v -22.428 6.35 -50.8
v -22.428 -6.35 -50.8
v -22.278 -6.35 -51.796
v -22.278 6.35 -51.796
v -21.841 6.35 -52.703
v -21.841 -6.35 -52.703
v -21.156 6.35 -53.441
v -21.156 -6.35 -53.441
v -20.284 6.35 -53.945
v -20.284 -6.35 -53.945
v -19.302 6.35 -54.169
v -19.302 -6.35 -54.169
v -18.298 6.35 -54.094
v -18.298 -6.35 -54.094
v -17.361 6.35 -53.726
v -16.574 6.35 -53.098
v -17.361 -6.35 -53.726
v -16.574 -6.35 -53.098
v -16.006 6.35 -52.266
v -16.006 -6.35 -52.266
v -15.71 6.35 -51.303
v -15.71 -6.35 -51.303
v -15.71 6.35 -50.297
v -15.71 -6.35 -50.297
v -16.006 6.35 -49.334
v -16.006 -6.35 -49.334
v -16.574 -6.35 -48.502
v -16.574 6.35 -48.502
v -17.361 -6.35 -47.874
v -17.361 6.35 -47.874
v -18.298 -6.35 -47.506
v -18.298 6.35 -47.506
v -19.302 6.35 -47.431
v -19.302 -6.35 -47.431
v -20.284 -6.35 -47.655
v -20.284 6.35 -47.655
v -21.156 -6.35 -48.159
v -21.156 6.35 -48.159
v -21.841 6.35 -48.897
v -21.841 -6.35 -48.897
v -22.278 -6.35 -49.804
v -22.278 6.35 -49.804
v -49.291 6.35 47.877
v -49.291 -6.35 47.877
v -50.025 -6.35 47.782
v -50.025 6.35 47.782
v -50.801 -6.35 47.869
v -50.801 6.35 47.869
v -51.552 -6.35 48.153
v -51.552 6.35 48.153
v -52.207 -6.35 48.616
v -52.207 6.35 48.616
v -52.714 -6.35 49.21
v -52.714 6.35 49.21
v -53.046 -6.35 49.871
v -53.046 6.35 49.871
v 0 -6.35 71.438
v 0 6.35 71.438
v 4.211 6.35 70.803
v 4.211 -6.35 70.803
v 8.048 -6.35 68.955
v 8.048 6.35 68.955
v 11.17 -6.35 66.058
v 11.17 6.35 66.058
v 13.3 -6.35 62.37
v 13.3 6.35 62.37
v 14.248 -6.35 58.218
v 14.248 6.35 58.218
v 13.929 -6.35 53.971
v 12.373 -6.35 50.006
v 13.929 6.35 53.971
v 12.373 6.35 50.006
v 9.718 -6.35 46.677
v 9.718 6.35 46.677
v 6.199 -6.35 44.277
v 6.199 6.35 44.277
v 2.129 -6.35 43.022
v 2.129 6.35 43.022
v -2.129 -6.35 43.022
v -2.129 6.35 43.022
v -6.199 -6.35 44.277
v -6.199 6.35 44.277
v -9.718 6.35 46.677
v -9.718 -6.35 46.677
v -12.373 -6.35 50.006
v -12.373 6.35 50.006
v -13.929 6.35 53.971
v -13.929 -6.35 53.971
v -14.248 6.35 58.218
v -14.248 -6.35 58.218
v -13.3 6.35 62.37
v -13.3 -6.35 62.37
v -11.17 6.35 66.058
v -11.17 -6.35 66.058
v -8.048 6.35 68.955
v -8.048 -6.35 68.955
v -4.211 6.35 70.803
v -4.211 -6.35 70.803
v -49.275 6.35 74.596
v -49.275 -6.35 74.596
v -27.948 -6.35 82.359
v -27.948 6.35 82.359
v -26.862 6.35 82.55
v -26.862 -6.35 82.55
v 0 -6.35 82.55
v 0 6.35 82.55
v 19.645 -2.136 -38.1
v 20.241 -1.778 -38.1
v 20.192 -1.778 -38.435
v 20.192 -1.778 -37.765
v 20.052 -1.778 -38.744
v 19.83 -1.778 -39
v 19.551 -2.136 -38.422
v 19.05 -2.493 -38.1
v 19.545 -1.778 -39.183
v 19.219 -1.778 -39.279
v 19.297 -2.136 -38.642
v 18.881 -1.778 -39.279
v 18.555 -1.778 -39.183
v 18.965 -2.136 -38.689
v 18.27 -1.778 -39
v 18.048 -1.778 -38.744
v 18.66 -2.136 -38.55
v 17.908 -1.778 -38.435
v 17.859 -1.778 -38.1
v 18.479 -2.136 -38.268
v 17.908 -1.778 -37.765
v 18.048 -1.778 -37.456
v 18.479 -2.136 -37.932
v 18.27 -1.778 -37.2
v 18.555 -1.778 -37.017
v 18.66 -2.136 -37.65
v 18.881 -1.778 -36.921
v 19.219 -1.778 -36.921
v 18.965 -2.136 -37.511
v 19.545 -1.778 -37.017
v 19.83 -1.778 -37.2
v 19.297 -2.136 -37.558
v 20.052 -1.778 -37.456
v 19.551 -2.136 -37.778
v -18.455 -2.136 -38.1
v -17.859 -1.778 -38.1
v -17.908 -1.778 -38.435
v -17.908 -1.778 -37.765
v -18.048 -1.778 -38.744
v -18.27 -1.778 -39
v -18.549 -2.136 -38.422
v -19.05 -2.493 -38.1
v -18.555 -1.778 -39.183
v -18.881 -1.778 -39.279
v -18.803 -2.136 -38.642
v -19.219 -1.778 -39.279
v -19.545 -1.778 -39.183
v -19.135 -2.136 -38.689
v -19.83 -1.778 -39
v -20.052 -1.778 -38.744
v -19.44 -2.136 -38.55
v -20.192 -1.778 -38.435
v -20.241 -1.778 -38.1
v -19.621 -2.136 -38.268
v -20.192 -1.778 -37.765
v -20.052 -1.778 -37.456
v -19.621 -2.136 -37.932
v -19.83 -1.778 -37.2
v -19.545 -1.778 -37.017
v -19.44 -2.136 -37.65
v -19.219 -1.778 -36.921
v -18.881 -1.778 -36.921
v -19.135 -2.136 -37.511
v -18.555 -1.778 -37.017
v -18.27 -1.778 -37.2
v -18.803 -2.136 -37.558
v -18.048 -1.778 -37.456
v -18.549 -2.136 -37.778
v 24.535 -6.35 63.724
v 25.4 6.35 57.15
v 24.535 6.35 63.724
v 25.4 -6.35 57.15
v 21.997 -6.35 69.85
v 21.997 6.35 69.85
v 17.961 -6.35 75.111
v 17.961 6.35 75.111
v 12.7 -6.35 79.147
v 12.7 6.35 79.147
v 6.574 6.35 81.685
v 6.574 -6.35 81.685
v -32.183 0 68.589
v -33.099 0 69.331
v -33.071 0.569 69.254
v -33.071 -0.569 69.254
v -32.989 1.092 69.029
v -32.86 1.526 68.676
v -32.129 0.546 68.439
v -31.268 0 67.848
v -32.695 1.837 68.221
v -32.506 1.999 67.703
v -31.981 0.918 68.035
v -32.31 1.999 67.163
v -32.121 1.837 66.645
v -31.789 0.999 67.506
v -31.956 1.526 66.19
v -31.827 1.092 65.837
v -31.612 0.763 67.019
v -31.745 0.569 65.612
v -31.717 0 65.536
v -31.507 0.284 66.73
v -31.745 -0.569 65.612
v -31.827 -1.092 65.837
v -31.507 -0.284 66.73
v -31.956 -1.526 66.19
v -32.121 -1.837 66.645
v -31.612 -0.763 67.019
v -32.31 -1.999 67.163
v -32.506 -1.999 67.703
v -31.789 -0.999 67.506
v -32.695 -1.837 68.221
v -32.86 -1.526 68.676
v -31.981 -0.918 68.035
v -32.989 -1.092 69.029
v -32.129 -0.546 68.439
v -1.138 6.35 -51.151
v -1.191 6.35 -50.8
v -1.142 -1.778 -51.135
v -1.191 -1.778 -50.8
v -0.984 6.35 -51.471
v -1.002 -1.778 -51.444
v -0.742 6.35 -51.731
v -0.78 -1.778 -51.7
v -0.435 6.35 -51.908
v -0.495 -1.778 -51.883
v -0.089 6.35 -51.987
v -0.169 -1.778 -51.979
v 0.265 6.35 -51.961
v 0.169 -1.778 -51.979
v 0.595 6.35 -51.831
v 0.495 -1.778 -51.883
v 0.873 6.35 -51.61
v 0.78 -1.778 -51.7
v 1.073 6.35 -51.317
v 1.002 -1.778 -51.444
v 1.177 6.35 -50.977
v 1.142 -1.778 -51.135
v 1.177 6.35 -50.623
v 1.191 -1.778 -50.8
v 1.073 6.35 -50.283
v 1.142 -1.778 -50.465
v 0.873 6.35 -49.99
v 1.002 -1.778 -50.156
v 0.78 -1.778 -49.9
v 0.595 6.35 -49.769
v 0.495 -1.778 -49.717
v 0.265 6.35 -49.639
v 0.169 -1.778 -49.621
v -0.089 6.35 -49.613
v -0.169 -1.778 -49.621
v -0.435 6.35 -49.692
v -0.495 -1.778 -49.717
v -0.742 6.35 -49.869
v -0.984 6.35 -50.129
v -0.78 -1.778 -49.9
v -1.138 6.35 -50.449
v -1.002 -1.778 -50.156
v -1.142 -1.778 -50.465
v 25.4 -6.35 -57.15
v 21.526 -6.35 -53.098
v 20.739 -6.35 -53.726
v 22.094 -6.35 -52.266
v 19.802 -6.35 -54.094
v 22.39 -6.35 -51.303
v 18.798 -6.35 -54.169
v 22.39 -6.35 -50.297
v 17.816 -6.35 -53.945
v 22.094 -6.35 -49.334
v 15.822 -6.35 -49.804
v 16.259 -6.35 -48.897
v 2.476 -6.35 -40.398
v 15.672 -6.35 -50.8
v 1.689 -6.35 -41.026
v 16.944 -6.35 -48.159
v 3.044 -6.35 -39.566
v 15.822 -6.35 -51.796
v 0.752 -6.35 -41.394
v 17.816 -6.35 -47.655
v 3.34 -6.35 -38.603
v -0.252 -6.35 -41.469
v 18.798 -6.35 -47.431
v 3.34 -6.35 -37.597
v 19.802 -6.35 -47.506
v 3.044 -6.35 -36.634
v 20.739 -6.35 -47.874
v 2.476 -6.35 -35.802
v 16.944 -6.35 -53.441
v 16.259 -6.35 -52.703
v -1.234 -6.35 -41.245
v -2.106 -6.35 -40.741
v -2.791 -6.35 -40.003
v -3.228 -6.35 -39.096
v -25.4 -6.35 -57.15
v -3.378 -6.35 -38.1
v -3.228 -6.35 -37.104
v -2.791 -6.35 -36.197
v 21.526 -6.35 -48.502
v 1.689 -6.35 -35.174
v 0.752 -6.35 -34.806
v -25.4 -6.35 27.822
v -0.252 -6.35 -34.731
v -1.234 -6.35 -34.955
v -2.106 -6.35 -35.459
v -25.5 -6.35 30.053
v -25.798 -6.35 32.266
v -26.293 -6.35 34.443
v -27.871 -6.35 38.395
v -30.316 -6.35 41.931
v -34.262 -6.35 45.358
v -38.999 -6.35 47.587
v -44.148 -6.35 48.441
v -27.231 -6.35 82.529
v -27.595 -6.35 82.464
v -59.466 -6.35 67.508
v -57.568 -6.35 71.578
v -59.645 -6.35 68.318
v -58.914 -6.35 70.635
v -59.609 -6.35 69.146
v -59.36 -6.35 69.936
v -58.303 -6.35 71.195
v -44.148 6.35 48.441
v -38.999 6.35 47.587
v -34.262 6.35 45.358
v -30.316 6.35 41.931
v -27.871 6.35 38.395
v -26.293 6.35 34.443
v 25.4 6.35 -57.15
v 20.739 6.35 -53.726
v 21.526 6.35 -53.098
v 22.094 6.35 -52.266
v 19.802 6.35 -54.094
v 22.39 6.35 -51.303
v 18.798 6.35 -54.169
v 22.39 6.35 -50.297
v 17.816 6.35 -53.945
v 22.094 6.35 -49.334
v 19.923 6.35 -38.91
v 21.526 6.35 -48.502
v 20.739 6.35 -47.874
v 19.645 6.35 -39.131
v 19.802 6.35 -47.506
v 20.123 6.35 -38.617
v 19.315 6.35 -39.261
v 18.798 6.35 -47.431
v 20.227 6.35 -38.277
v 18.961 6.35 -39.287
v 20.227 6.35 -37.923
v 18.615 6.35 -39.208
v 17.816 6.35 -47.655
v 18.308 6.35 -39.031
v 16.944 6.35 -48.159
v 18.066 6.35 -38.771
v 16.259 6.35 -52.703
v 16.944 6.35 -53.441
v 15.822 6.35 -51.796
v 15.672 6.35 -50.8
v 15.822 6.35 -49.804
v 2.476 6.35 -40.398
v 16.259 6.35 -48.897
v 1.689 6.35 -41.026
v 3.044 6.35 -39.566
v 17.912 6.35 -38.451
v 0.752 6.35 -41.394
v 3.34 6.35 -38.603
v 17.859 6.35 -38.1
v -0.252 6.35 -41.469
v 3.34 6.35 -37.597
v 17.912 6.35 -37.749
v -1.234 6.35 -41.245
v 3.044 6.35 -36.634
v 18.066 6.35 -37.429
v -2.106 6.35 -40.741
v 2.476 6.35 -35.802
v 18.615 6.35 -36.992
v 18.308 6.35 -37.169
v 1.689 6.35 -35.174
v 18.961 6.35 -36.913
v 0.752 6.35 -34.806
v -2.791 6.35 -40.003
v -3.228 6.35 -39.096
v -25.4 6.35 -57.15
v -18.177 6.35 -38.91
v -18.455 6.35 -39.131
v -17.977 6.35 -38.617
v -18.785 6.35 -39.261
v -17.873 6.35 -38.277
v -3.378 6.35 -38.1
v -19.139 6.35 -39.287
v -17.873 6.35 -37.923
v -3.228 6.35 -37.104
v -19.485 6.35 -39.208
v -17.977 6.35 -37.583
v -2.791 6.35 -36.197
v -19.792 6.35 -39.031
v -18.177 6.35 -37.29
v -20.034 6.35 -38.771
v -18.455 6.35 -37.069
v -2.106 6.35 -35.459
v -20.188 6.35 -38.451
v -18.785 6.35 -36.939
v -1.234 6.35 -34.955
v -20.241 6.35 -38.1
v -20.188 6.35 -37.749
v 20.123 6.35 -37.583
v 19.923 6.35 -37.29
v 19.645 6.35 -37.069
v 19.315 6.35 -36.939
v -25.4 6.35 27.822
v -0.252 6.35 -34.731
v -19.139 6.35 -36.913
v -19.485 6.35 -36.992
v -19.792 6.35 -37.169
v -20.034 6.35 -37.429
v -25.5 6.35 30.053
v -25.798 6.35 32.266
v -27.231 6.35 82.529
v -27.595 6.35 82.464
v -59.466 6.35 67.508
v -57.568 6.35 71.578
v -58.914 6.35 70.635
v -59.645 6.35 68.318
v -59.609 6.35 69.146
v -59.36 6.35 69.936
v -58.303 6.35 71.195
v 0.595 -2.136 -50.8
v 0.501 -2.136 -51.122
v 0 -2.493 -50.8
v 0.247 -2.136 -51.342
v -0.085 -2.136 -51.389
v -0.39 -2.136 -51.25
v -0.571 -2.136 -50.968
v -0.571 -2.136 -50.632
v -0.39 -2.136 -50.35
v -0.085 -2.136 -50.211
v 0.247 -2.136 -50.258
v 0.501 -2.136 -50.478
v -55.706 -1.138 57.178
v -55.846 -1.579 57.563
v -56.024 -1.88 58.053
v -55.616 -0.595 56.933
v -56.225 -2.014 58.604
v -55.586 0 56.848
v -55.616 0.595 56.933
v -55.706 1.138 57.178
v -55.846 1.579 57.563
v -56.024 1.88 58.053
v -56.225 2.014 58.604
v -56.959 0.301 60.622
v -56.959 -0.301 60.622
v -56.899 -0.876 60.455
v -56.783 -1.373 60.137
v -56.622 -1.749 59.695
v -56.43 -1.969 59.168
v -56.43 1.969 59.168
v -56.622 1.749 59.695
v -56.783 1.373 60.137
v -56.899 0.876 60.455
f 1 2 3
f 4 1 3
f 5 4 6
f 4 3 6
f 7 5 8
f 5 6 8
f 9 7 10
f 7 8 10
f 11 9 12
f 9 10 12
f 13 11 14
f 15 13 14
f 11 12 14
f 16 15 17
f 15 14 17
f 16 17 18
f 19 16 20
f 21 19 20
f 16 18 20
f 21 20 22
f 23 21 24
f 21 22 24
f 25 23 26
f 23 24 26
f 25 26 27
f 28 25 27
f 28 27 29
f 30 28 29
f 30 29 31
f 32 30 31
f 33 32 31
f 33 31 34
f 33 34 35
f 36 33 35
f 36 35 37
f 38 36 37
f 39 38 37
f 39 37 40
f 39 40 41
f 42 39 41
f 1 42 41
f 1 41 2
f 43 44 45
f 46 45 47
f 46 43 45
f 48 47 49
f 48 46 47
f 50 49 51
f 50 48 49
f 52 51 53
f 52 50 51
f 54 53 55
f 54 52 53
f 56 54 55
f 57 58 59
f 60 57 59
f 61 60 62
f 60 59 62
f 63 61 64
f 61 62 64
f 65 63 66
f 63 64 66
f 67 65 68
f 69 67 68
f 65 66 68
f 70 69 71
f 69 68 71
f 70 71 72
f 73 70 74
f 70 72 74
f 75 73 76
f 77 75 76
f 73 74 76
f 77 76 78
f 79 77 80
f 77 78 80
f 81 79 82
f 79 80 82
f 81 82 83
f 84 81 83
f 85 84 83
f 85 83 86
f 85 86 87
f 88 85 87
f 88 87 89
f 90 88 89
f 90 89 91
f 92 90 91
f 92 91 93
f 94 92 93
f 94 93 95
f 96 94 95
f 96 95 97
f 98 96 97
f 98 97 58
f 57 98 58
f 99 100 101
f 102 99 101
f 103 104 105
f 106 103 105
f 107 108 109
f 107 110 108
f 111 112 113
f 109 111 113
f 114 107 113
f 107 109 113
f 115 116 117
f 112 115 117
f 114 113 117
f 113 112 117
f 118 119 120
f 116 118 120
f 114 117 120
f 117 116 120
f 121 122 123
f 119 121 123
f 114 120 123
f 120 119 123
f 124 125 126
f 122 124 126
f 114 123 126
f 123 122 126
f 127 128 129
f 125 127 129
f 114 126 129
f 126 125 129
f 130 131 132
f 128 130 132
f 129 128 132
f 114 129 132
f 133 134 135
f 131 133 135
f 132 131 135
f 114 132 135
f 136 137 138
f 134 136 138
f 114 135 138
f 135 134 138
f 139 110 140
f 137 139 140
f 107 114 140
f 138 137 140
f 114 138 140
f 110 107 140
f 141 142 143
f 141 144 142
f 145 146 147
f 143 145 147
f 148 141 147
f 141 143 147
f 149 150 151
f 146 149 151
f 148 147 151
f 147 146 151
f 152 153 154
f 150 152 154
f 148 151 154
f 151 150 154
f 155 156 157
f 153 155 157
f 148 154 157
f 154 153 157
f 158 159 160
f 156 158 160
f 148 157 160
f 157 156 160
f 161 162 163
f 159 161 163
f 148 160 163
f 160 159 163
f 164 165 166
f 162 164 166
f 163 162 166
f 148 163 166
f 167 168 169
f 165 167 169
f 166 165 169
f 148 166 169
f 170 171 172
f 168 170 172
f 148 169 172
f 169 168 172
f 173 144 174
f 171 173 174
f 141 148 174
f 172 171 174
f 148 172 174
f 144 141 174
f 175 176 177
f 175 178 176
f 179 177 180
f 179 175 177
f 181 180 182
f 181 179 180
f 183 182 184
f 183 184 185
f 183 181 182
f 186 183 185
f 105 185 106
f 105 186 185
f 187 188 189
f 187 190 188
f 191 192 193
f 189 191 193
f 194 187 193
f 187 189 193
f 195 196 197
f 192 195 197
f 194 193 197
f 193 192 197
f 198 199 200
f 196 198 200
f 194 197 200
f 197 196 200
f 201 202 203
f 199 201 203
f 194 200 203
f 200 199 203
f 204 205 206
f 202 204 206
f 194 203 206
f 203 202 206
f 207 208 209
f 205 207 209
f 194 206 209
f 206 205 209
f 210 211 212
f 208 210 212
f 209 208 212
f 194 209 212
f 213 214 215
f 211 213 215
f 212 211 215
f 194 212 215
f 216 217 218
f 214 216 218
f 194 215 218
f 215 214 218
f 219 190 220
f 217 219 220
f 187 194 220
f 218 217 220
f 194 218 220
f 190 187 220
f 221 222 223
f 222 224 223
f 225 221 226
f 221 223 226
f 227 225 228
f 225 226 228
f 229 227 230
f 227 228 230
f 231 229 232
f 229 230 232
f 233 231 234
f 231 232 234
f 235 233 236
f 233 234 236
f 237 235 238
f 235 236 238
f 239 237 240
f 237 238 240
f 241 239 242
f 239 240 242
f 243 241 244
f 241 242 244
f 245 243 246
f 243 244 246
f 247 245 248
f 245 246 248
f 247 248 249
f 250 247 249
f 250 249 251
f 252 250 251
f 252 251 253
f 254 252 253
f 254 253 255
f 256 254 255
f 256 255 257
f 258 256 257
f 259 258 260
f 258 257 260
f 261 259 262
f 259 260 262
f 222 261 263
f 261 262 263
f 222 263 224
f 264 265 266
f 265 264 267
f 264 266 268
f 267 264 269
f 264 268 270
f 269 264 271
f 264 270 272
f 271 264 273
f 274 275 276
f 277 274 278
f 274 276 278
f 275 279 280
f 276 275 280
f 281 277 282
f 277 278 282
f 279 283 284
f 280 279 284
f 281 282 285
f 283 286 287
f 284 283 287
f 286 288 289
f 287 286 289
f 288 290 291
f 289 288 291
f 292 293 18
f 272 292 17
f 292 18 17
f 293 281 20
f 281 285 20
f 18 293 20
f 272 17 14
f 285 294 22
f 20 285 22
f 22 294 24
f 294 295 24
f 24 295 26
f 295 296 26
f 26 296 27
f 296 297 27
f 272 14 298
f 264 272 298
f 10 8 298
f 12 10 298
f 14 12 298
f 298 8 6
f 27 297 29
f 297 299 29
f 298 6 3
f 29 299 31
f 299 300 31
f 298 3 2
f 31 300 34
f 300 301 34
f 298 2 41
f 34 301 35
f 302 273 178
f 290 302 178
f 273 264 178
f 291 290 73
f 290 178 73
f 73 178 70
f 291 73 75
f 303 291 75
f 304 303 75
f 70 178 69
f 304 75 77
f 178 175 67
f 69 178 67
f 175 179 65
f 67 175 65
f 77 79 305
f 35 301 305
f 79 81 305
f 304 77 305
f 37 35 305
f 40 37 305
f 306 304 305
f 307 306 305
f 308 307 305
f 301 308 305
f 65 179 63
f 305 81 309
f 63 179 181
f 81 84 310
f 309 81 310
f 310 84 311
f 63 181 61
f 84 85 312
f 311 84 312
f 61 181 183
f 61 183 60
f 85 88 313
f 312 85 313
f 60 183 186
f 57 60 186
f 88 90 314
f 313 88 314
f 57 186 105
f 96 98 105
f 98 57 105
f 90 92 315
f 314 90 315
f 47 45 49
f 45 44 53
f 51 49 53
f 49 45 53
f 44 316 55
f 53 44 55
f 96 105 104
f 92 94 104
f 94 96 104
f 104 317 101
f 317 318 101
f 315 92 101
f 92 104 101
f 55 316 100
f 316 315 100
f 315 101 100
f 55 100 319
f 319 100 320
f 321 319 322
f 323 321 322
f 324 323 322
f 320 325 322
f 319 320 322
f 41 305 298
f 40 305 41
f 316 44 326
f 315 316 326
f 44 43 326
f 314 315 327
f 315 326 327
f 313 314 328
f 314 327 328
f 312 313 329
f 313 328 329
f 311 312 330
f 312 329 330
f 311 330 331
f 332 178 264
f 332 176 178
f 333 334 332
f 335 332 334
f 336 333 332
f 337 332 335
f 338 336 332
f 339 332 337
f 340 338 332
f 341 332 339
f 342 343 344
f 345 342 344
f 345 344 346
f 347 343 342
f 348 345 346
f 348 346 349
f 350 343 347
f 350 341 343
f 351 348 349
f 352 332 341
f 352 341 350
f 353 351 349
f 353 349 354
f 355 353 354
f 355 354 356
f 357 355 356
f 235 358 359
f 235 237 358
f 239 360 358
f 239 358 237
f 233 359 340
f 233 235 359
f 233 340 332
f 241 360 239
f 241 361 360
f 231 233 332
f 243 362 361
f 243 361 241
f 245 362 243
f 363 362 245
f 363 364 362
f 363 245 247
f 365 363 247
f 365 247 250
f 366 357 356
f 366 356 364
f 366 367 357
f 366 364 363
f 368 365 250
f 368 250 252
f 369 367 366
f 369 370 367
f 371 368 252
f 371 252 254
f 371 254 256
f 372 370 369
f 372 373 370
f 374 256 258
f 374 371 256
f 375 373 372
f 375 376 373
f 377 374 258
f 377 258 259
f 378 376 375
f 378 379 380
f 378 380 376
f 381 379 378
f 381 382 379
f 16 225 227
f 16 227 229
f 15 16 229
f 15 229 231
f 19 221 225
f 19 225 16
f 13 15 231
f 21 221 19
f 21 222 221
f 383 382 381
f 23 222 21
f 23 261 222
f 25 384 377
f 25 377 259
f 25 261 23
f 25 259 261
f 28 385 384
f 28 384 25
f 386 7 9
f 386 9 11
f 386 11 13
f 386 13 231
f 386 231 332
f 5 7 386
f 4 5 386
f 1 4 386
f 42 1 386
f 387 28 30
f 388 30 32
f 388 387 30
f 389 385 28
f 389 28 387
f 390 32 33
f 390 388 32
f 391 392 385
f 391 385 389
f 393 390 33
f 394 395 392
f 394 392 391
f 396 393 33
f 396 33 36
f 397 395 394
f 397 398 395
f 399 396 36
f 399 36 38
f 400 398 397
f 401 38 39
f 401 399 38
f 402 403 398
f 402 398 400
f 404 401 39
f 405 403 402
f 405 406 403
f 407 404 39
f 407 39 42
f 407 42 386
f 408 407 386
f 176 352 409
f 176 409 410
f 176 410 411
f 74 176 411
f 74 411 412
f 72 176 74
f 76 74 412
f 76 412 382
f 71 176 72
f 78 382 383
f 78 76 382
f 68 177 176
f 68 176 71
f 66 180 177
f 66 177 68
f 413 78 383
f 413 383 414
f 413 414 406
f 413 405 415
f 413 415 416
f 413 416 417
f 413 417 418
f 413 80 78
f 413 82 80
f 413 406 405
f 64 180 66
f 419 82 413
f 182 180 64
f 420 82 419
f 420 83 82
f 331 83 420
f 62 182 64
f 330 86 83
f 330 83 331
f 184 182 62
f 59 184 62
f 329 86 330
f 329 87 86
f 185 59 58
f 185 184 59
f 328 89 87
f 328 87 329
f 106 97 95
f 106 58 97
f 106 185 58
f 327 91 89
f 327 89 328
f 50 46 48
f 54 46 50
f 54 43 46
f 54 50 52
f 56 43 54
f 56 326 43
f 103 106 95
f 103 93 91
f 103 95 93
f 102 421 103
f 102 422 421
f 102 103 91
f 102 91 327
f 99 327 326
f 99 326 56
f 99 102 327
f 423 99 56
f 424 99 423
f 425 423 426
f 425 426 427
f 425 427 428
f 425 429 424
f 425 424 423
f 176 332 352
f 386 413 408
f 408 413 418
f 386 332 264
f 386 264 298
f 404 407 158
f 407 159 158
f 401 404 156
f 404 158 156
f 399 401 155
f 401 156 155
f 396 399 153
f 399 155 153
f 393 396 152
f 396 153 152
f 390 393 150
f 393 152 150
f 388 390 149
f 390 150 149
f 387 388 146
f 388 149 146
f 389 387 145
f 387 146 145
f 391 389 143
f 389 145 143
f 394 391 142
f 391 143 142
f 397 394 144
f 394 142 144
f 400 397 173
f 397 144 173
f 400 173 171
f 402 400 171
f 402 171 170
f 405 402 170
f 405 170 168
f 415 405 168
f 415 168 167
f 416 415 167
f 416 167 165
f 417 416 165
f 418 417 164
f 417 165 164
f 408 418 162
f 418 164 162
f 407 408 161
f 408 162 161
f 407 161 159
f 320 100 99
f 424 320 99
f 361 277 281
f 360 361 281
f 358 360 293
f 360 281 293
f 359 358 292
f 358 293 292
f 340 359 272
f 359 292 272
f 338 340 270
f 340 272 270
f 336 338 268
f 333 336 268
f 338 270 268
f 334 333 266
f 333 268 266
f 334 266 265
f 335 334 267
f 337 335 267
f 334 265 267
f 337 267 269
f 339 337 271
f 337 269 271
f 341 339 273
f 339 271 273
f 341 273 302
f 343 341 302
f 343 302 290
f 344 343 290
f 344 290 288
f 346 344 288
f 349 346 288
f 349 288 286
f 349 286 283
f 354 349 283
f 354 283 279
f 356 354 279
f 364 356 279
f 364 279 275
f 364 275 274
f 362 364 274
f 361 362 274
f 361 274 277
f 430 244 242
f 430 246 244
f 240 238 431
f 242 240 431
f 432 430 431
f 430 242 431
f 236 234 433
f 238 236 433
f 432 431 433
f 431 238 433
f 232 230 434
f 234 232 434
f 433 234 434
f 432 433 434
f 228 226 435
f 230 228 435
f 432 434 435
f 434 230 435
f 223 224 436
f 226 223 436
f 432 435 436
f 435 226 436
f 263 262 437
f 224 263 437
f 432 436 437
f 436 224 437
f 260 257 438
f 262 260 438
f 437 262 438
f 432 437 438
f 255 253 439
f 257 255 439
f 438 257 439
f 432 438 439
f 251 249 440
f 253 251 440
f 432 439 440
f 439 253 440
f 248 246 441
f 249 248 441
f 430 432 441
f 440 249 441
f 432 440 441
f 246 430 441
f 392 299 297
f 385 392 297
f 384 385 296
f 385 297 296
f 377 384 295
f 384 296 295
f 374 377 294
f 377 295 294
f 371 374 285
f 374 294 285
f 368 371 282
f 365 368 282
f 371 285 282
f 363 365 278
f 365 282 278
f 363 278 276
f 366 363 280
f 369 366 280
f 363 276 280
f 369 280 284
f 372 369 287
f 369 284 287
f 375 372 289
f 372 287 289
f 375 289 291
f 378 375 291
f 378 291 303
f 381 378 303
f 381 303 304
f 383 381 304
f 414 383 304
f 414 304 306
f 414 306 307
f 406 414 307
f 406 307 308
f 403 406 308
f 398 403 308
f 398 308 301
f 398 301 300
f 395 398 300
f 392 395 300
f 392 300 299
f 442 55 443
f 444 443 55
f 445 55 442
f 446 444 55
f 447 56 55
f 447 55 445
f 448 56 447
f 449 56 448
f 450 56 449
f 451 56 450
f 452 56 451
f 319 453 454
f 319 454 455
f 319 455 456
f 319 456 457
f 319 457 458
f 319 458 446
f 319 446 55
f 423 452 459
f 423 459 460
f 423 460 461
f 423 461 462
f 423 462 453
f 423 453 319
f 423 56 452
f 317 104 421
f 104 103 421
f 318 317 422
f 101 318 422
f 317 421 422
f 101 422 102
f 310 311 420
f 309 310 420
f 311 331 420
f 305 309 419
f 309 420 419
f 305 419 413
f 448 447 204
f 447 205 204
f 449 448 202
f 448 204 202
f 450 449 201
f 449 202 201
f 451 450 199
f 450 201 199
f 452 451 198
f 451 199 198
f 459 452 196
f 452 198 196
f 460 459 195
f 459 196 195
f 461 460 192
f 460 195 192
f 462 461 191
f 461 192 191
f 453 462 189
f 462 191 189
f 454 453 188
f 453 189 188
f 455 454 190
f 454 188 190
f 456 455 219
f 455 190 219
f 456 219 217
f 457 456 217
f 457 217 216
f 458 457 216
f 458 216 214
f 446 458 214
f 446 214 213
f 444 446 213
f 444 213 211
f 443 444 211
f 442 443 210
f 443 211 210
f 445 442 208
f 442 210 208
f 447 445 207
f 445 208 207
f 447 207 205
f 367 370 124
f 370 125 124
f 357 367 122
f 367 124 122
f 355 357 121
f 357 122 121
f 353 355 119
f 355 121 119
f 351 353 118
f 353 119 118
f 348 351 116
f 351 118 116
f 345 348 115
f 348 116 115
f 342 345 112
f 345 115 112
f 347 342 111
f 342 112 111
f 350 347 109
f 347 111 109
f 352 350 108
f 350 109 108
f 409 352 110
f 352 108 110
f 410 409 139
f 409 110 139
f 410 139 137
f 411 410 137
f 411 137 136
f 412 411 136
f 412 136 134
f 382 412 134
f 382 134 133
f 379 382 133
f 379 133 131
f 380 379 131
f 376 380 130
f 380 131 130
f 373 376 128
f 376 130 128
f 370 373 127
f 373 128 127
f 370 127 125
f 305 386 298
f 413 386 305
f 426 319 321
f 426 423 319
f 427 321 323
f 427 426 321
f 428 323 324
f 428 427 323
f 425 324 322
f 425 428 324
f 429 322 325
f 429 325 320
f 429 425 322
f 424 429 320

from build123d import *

# Parameters (mm, degrees)
BOSS_EXTRUDE1_DEPTH              = 6.35
FILLET1_R                        = 25.4
SKETCH11_R                       = 14.2875
CUT_EXTRUDE1_DEPTH               = 88.298066989
F_1_4_CLEARANCE_HOLE1_D          = 6.7564
BOSS_EXTRUDE2_DEPTH              = 12.7
FILLET2_R                        = 25
SKETCH25_W                       = 25
SKETCH25_H                       = 12.7
BOSS_EXTRUDE3_DEPTH              = 12
TAP_DRILL_FOR_10_32_TAP1_D       = 4.0386
TAP_DRILL_FOR_10_32_TAP1_DEPTH   = 25.4
TAP_DRILL_FOR_10_32_TAP1_TIP     = 1.213317848
FILLET4_R                        = 19.05
BOSS_EXTRUDE4_DEPTH              = 12.7
FILLET3_R                        = 3.175
F_3_32_0_09375_DOWEL_HOLE2_D     = 2.38125
F_3_32_0_09375_DOWEL_HOLE2_DEPTH = 8.128
F_3_32_0_09375_DOWEL_HOLE2_TIP   = 0.715399675


with BuildPart() as part:
    # Sketch2 → Boss-Extrude1 (new, symmetric)
    with BuildSketch(Plane(origin=(0, 0, 0), x_dir=(1, 0, 0), z_dir=(0, 1, 0))):
        Polygon((25.4, -82.55), (25.4, 0), (25.4, 57.15), (-25.4, 57.15), (-25.4, 0), (-25.4, -82.55), align=None)
    extrude(amount=BOSS_EXTRUDE1_DEPTH, both=True)

    # Fillet1
    fillet1_edges = [part.edges().sort_by_distance(p)[0] for p in [
        (25.4, 0, 82.55),
        (-25.4, 0, 82.55),
    ]]
    fillet(fillet1_edges, radius=FILLET1_R - 0.0001)  # a hair under: the kernel refuses the full size

    # Sketch11 → Cut-Extrude1 (cut, through all)
    with BuildSketch(Plane(origin=(0, 6.35, 0), x_dir=(1, 0, 0), z_dir=(0, 1, 0))):
        with Locations(Location((0, -57.15, 0), (0, 0, 270))):
            Circle(SKETCH11_R)
    extrude(amount=-CUT_EXTRUDE1_DEPTH, mode=Mode.SUBTRACT)

    # 1/4 Clearance Hole1 (through all)
    with Locations(Plane(origin=(0, 6.35, 0), x_dir=(1, 0, 0), z_dir=(0, 1, 0))):
        with Locations((-19.05, 50.8), (19.05, 50.8), (0, 38.1)):
            Hole(F_1_4_CLEARANCE_HOLE1_D / 2)

    # Sketch15 → Boss-Extrude2 (add)
    with BuildSketch(Plane.XZ.offset(6.35)):
        with BuildLine():
            Line((-4.225282002, 82.196097341), (-49.275251792, 74.59615776))
            Line((-49.275251792, 74.59615776), (-40.724748208, 51.10384224))
            Line((-40.724748208, 51.10384224), (-25.4, 42.256094737))
            Line((-25.4, 42.256094737), (-25.4, 57.15))
            ThreePointArc((-25.4, 57.15), (-19.396934846, 73.54874747), (-4.225282002, 82.196097341))
        make_face()
    extrude(amount=-BOSS_EXTRUDE2_DEPTH)

    # Fillet2
    fillet2_edges = [part.edges().sort_by_distance(p)[0] for p in [
        (-25.4, 0, 42.256094737),
    ]]
    fillet(fillet2_edges, radius=FILLET2_R)

    # Sketch25 → Boss-Extrude3 (add)
    with BuildSketch(Plane(origin=(-19.536399336, 0, -7.110667843), x_dir=(-0.34202014332566627, 0, 0.9396926207859093), z_dir=(-0.9396926207859093, 0, -0.34202014332566627))):
        with Locations((74.450587666, 0)):
            Rectangle(SKETCH25_W, SKETCH25_H)
    extrude(amount=BOSS_EXTRUDE3_DEPTH)

    # Tap Drill for #10-32 Tap1
    with Locations(Plane(origin=(-30.812710785, 0, -11.214909563), x_dir=(-0.3420201433256665, 0, 0.9396926207859093), z_dir=(-0.9396926207859092, 0, -0.34202014332566644))):
        with Locations((74.450587666, 0)):
            Hole(TAP_DRILL_FOR_10_32_TAP1_D / 2, depth=TAP_DRILL_FOR_10_32_TAP1_DEPTH)
            with Locations((0, 0, -(TAP_DRILL_FOR_10_32_TAP1_DEPTH + TAP_DRILL_FOR_10_32_TAP1_TIP / 2))):  # 118° drill point
                Cone(0, TAP_DRILL_FOR_10_32_TAP1_D / 2, TAP_DRILL_FOR_10_32_TAP1_TIP, mode=Mode.SUBTRACT)

    # Fillet4
    fillet4_edges = [part.edges().sort_by_distance(p)[0] for p in [
        (-40.724748208, 0, 51.10384224),
    ]]
    fillet(fillet4_edges, radius=FILLET4_R)

    # Sketch26 → Boss-Extrude4 (add)
    with BuildSketch(Plane.XZ.offset(6.35)):
        Polygon((-27.422249839, 82.55), (0, 82.55), (-49.275251792, 74.59615776), align=None)
    extrude(amount=-BOSS_EXTRUDE4_DEPTH)

    # Fillet3
    fillet3_edges = [part.edges().sort_by_distance(p)[0] for p in [
        (-60.551563241, 0, 70.49191604),
        (-52.001059658, 0, 46.99960052),
        (-27.422249839, 0, 82.55),
    ]]
    fillet(fillet3_edges, radius=FILLET3_R)

    # 3/32 (0.09375) Dowel Hole2
    with Locations(Plane(origin=(0, 6.35, 0), x_dir=(1, 0, 0), z_dir=(0, 1, 0))):
        with Locations((19.05, 38.1), (0, 50.8), (-19.05, 38.1), (0, 38.1)):
            Hole(F_3_32_0_09375_DOWEL_HOLE2_D / 2, depth=F_3_32_0_09375_DOWEL_HOLE2_DEPTH)
            with Locations((0, 0, -(F_3_32_0_09375_DOWEL_HOLE2_DEPTH + F_3_32_0_09375_DOWEL_HOLE2_TIP / 2))):  # 118° drill point
                Cone(0, F_3_32_0_09375_DOWEL_HOLE2_D / 2, F_3_32_0_09375_DOWEL_HOLE2_TIP, mode=Mode.SUBTRACT)


solid = part.part
